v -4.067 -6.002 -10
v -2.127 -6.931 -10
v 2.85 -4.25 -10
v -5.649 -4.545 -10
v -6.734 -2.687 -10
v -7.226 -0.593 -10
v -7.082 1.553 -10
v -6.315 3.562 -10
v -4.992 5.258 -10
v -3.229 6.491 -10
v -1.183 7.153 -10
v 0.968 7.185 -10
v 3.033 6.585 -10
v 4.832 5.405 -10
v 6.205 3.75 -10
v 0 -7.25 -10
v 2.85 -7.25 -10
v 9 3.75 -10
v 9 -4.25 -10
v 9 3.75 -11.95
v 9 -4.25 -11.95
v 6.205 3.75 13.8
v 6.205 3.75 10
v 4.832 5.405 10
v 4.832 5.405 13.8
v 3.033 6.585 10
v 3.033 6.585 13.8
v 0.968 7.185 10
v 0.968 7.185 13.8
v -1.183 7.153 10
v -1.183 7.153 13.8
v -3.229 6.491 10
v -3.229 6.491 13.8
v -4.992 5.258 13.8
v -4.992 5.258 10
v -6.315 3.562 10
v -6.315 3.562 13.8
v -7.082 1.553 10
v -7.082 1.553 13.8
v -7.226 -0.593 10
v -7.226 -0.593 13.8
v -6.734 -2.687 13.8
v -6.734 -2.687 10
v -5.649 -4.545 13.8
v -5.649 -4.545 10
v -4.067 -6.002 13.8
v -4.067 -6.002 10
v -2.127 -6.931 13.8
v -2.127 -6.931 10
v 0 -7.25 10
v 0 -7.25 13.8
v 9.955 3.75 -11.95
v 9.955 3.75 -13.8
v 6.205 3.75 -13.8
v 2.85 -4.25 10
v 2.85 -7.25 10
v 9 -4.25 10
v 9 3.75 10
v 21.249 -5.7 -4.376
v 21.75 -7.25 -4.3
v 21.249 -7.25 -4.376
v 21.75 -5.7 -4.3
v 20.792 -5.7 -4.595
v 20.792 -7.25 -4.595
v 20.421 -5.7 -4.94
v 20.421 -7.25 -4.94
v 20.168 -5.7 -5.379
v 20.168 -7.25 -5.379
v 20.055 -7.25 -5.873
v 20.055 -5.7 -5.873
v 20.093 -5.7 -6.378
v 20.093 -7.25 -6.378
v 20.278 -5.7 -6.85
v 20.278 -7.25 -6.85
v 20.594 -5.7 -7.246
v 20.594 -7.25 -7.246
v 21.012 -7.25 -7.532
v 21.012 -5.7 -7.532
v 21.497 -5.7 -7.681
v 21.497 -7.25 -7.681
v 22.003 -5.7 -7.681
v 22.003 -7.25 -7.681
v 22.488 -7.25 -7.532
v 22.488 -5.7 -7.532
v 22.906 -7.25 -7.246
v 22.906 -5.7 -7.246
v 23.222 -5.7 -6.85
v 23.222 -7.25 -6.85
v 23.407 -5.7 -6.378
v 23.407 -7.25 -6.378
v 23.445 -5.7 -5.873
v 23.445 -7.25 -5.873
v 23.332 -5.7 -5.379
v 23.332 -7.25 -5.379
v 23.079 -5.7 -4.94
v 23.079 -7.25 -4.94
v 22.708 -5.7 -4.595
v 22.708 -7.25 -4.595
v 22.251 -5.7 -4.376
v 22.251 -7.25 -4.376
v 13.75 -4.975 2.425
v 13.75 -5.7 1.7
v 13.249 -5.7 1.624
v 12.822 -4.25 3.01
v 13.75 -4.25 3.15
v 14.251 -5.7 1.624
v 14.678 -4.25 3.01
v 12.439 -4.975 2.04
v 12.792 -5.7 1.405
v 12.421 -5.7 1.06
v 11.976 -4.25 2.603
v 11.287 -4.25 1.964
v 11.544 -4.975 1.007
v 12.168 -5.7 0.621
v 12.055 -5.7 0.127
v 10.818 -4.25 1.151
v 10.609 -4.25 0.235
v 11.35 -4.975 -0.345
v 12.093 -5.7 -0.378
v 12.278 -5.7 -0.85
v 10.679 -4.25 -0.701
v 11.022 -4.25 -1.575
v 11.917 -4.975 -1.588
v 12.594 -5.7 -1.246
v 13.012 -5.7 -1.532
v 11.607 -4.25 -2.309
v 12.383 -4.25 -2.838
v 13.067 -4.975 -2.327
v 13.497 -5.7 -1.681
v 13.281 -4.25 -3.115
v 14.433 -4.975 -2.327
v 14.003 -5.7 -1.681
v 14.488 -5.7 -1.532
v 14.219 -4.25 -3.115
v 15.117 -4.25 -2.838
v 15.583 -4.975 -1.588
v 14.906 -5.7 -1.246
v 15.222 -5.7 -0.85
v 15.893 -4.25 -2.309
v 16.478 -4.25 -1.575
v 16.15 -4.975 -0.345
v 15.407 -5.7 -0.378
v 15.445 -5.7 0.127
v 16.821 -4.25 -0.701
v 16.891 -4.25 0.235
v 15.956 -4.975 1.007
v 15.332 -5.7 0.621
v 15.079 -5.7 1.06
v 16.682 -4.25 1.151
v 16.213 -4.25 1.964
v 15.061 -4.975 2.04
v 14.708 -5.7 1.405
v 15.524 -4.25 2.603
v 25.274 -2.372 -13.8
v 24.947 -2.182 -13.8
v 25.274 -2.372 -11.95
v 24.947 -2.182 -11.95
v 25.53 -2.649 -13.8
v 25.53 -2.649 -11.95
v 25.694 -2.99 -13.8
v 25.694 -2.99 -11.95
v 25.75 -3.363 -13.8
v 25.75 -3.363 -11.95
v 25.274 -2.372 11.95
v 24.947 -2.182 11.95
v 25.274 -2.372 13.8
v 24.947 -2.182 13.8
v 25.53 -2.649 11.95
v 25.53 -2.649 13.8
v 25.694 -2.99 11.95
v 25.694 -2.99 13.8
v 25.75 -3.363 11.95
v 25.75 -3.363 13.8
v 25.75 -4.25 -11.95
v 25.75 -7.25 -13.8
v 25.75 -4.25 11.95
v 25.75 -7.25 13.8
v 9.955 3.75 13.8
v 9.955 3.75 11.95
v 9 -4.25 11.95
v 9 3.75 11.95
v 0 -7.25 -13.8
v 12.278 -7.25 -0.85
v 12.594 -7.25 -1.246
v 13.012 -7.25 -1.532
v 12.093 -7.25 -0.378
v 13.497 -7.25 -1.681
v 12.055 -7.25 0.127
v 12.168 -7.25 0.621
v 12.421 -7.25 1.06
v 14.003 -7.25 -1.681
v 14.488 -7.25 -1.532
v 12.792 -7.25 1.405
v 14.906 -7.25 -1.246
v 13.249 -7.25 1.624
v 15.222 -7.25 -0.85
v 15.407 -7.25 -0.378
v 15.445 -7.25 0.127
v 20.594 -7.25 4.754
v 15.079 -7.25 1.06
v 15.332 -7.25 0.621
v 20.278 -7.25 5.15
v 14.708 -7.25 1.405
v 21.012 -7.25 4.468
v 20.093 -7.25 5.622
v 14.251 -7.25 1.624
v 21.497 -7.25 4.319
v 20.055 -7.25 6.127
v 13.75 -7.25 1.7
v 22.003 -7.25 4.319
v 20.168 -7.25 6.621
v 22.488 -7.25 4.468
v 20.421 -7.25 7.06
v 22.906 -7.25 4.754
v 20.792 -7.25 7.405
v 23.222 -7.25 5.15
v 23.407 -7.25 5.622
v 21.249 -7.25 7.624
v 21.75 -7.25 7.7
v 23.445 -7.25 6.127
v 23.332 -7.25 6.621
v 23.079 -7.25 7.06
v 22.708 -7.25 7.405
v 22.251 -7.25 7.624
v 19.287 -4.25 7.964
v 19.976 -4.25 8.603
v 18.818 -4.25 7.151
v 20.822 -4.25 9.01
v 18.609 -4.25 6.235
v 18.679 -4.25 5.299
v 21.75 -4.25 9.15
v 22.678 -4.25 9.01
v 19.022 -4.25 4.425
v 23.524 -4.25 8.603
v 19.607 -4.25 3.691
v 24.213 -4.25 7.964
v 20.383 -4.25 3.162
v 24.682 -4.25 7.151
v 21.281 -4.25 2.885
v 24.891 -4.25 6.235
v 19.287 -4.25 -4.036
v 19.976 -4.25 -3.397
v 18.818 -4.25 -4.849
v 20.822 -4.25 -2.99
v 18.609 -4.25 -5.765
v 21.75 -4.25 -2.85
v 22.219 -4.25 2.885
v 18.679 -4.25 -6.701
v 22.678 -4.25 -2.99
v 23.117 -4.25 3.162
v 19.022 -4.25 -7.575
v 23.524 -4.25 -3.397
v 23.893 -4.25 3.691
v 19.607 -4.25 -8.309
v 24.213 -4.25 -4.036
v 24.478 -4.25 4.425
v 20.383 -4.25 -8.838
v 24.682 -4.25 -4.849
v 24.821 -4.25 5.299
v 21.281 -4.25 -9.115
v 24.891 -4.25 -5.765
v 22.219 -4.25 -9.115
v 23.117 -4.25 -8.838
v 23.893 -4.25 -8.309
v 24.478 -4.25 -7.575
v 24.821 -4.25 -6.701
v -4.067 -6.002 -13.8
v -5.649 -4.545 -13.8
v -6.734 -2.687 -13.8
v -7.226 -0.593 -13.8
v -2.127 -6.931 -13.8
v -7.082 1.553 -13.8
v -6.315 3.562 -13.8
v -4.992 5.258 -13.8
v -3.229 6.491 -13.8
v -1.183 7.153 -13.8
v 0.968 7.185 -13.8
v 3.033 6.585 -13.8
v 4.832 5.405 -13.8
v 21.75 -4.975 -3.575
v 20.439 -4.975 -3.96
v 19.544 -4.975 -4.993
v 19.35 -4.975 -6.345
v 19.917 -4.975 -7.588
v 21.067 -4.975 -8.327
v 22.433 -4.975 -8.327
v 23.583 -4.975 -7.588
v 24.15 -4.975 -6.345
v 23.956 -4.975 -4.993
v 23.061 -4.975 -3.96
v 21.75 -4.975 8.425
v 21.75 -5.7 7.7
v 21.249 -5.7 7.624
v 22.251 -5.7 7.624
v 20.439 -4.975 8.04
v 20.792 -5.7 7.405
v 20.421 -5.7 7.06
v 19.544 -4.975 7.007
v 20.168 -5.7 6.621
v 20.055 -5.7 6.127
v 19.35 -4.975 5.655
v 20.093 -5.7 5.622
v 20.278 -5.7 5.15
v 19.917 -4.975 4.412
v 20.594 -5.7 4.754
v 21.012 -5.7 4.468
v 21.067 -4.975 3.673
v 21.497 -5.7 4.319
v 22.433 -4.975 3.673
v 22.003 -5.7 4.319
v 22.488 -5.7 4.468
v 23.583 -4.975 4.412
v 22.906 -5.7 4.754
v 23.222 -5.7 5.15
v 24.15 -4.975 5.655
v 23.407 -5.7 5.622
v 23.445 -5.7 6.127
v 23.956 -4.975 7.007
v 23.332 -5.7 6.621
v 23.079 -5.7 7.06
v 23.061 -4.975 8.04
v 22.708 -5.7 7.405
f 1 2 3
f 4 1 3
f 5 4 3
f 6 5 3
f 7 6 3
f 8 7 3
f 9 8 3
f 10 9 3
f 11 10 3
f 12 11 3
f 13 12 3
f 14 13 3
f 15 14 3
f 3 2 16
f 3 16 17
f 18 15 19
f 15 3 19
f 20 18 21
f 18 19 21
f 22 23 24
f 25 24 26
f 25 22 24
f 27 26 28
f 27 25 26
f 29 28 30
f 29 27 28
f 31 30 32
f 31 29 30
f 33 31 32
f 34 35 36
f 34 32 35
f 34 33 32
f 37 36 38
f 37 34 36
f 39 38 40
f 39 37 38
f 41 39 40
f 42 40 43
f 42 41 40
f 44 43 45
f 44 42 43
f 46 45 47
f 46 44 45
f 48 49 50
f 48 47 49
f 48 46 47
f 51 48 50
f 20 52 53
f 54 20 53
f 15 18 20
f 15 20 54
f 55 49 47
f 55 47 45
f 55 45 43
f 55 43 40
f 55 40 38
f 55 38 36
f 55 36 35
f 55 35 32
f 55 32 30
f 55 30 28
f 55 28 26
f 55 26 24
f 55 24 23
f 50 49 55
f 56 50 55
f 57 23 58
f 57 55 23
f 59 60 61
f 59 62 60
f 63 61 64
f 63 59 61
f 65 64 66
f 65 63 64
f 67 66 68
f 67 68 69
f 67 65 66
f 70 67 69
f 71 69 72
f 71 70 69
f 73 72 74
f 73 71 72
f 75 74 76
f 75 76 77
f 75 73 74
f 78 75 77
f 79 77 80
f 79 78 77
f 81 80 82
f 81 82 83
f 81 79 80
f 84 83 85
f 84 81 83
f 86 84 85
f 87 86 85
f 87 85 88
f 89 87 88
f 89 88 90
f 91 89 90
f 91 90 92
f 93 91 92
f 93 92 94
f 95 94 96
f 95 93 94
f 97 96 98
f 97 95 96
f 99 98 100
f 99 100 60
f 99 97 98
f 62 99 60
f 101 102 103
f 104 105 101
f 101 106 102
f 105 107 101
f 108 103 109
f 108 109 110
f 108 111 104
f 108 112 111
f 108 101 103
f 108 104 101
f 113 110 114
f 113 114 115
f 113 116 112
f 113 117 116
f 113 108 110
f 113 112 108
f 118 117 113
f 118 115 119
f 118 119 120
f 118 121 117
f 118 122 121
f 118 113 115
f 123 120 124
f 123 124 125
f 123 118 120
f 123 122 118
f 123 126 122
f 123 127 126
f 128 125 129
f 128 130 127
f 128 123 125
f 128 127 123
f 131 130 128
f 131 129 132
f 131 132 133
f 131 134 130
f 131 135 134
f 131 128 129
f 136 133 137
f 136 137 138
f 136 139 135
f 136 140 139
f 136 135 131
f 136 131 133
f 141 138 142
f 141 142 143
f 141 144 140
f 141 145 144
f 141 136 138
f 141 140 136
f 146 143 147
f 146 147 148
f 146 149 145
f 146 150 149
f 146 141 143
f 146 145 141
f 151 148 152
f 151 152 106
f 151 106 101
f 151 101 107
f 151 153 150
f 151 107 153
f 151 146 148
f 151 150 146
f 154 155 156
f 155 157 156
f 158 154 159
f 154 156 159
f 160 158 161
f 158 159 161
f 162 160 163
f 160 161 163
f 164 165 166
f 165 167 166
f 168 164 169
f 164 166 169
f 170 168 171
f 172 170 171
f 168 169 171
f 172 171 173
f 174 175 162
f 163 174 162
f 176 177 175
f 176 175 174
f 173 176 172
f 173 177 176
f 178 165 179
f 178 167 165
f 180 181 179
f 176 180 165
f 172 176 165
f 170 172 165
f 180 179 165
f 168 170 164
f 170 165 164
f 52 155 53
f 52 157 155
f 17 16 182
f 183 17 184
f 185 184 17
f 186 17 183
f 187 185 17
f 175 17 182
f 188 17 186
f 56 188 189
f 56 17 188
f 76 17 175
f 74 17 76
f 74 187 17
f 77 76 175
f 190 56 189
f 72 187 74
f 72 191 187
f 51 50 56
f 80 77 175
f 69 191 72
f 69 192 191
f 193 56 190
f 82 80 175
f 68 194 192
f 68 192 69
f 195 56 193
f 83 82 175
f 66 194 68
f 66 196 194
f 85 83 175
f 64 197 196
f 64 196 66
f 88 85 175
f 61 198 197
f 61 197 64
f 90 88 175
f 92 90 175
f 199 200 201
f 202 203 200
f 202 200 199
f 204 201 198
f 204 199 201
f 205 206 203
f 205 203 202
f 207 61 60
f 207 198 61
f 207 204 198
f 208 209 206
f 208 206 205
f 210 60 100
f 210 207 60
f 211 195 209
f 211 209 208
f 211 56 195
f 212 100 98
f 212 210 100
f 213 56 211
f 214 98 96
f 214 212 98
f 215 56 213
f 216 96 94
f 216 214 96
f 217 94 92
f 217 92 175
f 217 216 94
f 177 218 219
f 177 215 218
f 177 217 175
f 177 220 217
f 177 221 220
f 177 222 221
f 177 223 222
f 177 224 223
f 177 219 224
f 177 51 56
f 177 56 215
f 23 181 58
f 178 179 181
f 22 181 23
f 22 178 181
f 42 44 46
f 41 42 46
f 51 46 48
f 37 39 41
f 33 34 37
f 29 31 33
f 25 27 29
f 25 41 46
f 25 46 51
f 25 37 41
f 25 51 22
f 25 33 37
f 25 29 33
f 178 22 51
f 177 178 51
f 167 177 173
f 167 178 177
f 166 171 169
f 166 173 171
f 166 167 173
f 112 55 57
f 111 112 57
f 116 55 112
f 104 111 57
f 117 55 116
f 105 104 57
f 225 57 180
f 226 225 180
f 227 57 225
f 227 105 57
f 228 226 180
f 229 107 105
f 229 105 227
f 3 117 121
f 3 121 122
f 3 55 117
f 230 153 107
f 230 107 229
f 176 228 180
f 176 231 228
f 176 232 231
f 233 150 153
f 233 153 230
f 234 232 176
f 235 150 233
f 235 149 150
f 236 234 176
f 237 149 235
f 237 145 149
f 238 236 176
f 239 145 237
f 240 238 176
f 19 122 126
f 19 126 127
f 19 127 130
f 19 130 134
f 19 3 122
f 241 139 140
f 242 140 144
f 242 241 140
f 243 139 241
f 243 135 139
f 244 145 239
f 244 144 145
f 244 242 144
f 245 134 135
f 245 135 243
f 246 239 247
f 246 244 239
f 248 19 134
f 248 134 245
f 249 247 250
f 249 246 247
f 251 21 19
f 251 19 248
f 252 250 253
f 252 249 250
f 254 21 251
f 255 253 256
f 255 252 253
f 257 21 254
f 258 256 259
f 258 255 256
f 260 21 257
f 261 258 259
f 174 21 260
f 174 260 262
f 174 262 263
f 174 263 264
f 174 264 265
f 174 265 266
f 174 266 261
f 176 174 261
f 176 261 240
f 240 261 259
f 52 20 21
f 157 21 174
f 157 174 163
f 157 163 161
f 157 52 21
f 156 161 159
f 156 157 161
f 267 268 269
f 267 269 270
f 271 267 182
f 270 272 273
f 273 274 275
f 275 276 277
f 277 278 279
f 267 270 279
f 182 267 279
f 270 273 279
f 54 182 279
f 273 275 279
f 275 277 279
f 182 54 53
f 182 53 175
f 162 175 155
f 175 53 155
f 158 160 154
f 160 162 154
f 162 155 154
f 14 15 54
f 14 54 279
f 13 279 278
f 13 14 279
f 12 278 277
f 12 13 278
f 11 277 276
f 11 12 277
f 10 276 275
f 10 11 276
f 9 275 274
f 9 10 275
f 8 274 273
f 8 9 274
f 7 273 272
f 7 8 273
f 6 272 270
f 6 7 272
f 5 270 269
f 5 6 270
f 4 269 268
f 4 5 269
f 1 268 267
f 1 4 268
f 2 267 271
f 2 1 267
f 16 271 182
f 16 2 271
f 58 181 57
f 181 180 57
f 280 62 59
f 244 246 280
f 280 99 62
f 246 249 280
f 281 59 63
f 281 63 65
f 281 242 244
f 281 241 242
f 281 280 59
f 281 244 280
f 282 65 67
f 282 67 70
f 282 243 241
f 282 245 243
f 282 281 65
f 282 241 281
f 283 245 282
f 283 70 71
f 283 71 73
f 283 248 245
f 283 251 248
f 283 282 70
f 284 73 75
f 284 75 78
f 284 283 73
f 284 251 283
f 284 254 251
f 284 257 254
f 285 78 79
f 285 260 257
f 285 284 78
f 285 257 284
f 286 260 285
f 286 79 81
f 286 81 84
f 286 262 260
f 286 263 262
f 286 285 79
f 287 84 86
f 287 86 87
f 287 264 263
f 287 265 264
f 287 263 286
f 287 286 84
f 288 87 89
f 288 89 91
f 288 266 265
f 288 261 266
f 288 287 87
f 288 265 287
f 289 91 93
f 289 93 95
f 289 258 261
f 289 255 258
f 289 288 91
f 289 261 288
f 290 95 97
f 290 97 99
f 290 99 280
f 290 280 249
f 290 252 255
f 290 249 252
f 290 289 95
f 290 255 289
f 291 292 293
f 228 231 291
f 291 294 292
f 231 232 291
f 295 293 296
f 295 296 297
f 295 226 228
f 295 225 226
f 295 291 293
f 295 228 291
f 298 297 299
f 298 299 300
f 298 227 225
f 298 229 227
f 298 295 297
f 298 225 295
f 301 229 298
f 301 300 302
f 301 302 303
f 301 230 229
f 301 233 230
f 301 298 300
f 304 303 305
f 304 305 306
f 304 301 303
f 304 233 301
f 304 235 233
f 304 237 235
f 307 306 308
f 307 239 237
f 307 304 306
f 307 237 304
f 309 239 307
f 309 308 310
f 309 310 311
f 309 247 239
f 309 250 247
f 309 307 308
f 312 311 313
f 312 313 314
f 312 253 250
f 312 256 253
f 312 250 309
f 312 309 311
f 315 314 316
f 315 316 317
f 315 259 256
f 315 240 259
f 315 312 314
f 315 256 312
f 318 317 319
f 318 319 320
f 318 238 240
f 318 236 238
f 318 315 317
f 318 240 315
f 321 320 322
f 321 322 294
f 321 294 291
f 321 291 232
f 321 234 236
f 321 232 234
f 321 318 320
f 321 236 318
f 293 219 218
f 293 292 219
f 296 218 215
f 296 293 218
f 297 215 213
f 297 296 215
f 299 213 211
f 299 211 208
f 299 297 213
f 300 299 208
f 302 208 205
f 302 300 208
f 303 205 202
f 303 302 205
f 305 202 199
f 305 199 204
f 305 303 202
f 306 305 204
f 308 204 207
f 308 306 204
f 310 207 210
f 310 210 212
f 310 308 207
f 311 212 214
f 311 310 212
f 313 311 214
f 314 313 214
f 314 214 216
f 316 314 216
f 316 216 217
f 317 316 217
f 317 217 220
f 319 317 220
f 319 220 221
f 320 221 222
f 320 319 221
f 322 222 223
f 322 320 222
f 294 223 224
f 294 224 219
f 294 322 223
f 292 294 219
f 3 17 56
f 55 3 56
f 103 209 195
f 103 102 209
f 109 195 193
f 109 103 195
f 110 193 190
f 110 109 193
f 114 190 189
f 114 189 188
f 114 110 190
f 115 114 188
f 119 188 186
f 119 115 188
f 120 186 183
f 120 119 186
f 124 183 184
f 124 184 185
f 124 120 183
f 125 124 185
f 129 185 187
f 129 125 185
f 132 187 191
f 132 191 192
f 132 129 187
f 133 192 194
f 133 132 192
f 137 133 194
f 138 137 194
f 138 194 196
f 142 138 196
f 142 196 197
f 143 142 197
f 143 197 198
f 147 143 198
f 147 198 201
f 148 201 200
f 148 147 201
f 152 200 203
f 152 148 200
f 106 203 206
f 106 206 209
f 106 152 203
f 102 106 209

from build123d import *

# Parameters (mm, degrees)
BOSS_EXTRUDE1_DEPTH                            = 13.8
SKETCH2_W                                      = 16.75
SKETCH2_H                                      = 23.9
CUT_EXTRUDE1_DEPTH                             = 8.25
CUT_EXTRUDE1_DEPTH_BACK                        = 4.25
SKETCH3_W                                      = 10.1
SKETCH3_H                                      = 20
CUT_EXTRUDE2_DEPTH                             = 15.5
SKETCH4_W                                      = 6.15
SKETCH4_H                                      = 20
CUT_EXTRUDE3_DEPTH                             = 12.5
FILLET1_R                                      = 1.27
CSK_FOR_M3_FLAT_HEAD_MACHINE_SCREW1_AT_2_COUNT = 2
CSK_FOR_M3_FLAT_HEAD_MACHINE_SCREW1_AT_2_PITCH = 10
CSK_FOR_M3_FLAT_HEAD_MACHINE_SCREW1_AT_3_COUNT = 2
CSK_FOR_M3_FLAT_HEAD_MACHINE_SCREW1_AT_3_PITCH = 12


with BuildPart() as part:
    # Sketch1 → Boss-Extrude1 (new body, symmetric)
    with BuildSketch(Plane.XY):
        with BuildLine():
            Line((0, -7.25), (25.75, -7.25))
            Line((25.75, -7.25), (25.75, -2.5))
            Line((25.75, -2.5), (9.954836823, 3.75))
            Line((9.954836823, 3.75), (6.204836823, 3.75))
            ThreePointArc((6.204836823, 3.75), (-6.31466547, 3.561951712), (0, -7.25))
        make_face()
    extrude(amount=BOSS_EXTRUDE1_DEPTH, both=True)

    # Sketch2 → Cut-Extrude1 (cut, two sides)
    with BuildSketch(Plane(origin=(0, 0, 0), x_dir=(1, 0, 0), z_dir=(0, 1, 0))) as cut_extrude1_sk:
        with Locations((17.375, 0)):
            Rectangle(SKETCH2_W, SKETCH2_H)
    extrude(amount=CUT_EXTRUDE1_DEPTH, mode=Mode.SUBTRACT)
    extrude(cut_extrude1_sk.sketch, amount=-CUT_EXTRUDE1_DEPTH_BACK, mode=Mode.SUBTRACT)

    # Sketch3 → Cut-Extrude2 (cut, through all)
    with BuildSketch(Plane.XZ.offset(7.25)):
        with Locations((-2.2, 0)):
            Rectangle(SKETCH3_W, SKETCH3_H)
    extrude(amount=-CUT_EXTRUDE2_DEPTH, mode=Mode.SUBTRACT)

    # Sketch4 → Cut-Extrude3 (cut, through all)
    with BuildSketch(Plane(origin=(0, -4.25, 0), x_dir=(1, 0, 0), z_dir=(0, 1, 0))):
        with Locations((5.925, 0)):
            Rectangle(SKETCH4_W, SKETCH4_H)
    extrude(amount=CUT_EXTRUDE3_DEPTH, mode=Mode.SUBTRACT)

    # Fillet1
    fillet1_edges = [part.edges().sort_by_distance(p)[0] for p in [
        (25.75, -2.5, -12.875),
        (25.75, -2.5, 12.875),
    ]]
    fillet(fillet1_edges, radius=FILLET1_R)

    # Sketch6 → CSK for M3 Flat Head Machine Screw1 (revolve, cut)
    with BuildSketch(Plane(origin=(21.75, -4.25, -6), x_dir=(0, 0, 1), z_dir=(1, 0, 0))):
        Polygon((0, 0), (0, 3), (1.7, 3), (1.7, 1.45), (3.15, 0), align=None)
    csk_for_m3_flat_head_machine_screw1 = revolve(axis=Axis((21.75, 2.1, -6), (0, -1, 0)), mode=Mode.SUBTRACT)

    # CSK for M3 Flat Head Machine Screw1 at 2: CSK for M3 Flat Head Machine Screw1 ×2
    with Locations(*[Vector(-0.8, 0, 0.6) * (i * CSK_FOR_M3_FLAT_HEAD_MACHINE_SCREW1_AT_2_PITCH) for i in range(1, CSK_FOR_M3_FLAT_HEAD_MACHINE_SCREW1_AT_2_COUNT)]):
        add(csk_for_m3_flat_head_machine_screw1, mode=Mode.SUBTRACT)

    # CSK for M3 Flat Head Machine Screw1 at 3: CSK for M3 Flat Head Machine Screw1 ×2
    with Locations(*[(0, 0, i * CSK_FOR_M3_FLAT_HEAD_MACHINE_SCREW1_AT_3_PITCH) for i in range(1, CSK_FOR_M3_FLAT_HEAD_MACHINE_SCREW1_AT_3_COUNT)]):
        add(csk_for_m3_flat_head_machine_screw1, mode=Mode.SUBTRACT)


solid = part.part
